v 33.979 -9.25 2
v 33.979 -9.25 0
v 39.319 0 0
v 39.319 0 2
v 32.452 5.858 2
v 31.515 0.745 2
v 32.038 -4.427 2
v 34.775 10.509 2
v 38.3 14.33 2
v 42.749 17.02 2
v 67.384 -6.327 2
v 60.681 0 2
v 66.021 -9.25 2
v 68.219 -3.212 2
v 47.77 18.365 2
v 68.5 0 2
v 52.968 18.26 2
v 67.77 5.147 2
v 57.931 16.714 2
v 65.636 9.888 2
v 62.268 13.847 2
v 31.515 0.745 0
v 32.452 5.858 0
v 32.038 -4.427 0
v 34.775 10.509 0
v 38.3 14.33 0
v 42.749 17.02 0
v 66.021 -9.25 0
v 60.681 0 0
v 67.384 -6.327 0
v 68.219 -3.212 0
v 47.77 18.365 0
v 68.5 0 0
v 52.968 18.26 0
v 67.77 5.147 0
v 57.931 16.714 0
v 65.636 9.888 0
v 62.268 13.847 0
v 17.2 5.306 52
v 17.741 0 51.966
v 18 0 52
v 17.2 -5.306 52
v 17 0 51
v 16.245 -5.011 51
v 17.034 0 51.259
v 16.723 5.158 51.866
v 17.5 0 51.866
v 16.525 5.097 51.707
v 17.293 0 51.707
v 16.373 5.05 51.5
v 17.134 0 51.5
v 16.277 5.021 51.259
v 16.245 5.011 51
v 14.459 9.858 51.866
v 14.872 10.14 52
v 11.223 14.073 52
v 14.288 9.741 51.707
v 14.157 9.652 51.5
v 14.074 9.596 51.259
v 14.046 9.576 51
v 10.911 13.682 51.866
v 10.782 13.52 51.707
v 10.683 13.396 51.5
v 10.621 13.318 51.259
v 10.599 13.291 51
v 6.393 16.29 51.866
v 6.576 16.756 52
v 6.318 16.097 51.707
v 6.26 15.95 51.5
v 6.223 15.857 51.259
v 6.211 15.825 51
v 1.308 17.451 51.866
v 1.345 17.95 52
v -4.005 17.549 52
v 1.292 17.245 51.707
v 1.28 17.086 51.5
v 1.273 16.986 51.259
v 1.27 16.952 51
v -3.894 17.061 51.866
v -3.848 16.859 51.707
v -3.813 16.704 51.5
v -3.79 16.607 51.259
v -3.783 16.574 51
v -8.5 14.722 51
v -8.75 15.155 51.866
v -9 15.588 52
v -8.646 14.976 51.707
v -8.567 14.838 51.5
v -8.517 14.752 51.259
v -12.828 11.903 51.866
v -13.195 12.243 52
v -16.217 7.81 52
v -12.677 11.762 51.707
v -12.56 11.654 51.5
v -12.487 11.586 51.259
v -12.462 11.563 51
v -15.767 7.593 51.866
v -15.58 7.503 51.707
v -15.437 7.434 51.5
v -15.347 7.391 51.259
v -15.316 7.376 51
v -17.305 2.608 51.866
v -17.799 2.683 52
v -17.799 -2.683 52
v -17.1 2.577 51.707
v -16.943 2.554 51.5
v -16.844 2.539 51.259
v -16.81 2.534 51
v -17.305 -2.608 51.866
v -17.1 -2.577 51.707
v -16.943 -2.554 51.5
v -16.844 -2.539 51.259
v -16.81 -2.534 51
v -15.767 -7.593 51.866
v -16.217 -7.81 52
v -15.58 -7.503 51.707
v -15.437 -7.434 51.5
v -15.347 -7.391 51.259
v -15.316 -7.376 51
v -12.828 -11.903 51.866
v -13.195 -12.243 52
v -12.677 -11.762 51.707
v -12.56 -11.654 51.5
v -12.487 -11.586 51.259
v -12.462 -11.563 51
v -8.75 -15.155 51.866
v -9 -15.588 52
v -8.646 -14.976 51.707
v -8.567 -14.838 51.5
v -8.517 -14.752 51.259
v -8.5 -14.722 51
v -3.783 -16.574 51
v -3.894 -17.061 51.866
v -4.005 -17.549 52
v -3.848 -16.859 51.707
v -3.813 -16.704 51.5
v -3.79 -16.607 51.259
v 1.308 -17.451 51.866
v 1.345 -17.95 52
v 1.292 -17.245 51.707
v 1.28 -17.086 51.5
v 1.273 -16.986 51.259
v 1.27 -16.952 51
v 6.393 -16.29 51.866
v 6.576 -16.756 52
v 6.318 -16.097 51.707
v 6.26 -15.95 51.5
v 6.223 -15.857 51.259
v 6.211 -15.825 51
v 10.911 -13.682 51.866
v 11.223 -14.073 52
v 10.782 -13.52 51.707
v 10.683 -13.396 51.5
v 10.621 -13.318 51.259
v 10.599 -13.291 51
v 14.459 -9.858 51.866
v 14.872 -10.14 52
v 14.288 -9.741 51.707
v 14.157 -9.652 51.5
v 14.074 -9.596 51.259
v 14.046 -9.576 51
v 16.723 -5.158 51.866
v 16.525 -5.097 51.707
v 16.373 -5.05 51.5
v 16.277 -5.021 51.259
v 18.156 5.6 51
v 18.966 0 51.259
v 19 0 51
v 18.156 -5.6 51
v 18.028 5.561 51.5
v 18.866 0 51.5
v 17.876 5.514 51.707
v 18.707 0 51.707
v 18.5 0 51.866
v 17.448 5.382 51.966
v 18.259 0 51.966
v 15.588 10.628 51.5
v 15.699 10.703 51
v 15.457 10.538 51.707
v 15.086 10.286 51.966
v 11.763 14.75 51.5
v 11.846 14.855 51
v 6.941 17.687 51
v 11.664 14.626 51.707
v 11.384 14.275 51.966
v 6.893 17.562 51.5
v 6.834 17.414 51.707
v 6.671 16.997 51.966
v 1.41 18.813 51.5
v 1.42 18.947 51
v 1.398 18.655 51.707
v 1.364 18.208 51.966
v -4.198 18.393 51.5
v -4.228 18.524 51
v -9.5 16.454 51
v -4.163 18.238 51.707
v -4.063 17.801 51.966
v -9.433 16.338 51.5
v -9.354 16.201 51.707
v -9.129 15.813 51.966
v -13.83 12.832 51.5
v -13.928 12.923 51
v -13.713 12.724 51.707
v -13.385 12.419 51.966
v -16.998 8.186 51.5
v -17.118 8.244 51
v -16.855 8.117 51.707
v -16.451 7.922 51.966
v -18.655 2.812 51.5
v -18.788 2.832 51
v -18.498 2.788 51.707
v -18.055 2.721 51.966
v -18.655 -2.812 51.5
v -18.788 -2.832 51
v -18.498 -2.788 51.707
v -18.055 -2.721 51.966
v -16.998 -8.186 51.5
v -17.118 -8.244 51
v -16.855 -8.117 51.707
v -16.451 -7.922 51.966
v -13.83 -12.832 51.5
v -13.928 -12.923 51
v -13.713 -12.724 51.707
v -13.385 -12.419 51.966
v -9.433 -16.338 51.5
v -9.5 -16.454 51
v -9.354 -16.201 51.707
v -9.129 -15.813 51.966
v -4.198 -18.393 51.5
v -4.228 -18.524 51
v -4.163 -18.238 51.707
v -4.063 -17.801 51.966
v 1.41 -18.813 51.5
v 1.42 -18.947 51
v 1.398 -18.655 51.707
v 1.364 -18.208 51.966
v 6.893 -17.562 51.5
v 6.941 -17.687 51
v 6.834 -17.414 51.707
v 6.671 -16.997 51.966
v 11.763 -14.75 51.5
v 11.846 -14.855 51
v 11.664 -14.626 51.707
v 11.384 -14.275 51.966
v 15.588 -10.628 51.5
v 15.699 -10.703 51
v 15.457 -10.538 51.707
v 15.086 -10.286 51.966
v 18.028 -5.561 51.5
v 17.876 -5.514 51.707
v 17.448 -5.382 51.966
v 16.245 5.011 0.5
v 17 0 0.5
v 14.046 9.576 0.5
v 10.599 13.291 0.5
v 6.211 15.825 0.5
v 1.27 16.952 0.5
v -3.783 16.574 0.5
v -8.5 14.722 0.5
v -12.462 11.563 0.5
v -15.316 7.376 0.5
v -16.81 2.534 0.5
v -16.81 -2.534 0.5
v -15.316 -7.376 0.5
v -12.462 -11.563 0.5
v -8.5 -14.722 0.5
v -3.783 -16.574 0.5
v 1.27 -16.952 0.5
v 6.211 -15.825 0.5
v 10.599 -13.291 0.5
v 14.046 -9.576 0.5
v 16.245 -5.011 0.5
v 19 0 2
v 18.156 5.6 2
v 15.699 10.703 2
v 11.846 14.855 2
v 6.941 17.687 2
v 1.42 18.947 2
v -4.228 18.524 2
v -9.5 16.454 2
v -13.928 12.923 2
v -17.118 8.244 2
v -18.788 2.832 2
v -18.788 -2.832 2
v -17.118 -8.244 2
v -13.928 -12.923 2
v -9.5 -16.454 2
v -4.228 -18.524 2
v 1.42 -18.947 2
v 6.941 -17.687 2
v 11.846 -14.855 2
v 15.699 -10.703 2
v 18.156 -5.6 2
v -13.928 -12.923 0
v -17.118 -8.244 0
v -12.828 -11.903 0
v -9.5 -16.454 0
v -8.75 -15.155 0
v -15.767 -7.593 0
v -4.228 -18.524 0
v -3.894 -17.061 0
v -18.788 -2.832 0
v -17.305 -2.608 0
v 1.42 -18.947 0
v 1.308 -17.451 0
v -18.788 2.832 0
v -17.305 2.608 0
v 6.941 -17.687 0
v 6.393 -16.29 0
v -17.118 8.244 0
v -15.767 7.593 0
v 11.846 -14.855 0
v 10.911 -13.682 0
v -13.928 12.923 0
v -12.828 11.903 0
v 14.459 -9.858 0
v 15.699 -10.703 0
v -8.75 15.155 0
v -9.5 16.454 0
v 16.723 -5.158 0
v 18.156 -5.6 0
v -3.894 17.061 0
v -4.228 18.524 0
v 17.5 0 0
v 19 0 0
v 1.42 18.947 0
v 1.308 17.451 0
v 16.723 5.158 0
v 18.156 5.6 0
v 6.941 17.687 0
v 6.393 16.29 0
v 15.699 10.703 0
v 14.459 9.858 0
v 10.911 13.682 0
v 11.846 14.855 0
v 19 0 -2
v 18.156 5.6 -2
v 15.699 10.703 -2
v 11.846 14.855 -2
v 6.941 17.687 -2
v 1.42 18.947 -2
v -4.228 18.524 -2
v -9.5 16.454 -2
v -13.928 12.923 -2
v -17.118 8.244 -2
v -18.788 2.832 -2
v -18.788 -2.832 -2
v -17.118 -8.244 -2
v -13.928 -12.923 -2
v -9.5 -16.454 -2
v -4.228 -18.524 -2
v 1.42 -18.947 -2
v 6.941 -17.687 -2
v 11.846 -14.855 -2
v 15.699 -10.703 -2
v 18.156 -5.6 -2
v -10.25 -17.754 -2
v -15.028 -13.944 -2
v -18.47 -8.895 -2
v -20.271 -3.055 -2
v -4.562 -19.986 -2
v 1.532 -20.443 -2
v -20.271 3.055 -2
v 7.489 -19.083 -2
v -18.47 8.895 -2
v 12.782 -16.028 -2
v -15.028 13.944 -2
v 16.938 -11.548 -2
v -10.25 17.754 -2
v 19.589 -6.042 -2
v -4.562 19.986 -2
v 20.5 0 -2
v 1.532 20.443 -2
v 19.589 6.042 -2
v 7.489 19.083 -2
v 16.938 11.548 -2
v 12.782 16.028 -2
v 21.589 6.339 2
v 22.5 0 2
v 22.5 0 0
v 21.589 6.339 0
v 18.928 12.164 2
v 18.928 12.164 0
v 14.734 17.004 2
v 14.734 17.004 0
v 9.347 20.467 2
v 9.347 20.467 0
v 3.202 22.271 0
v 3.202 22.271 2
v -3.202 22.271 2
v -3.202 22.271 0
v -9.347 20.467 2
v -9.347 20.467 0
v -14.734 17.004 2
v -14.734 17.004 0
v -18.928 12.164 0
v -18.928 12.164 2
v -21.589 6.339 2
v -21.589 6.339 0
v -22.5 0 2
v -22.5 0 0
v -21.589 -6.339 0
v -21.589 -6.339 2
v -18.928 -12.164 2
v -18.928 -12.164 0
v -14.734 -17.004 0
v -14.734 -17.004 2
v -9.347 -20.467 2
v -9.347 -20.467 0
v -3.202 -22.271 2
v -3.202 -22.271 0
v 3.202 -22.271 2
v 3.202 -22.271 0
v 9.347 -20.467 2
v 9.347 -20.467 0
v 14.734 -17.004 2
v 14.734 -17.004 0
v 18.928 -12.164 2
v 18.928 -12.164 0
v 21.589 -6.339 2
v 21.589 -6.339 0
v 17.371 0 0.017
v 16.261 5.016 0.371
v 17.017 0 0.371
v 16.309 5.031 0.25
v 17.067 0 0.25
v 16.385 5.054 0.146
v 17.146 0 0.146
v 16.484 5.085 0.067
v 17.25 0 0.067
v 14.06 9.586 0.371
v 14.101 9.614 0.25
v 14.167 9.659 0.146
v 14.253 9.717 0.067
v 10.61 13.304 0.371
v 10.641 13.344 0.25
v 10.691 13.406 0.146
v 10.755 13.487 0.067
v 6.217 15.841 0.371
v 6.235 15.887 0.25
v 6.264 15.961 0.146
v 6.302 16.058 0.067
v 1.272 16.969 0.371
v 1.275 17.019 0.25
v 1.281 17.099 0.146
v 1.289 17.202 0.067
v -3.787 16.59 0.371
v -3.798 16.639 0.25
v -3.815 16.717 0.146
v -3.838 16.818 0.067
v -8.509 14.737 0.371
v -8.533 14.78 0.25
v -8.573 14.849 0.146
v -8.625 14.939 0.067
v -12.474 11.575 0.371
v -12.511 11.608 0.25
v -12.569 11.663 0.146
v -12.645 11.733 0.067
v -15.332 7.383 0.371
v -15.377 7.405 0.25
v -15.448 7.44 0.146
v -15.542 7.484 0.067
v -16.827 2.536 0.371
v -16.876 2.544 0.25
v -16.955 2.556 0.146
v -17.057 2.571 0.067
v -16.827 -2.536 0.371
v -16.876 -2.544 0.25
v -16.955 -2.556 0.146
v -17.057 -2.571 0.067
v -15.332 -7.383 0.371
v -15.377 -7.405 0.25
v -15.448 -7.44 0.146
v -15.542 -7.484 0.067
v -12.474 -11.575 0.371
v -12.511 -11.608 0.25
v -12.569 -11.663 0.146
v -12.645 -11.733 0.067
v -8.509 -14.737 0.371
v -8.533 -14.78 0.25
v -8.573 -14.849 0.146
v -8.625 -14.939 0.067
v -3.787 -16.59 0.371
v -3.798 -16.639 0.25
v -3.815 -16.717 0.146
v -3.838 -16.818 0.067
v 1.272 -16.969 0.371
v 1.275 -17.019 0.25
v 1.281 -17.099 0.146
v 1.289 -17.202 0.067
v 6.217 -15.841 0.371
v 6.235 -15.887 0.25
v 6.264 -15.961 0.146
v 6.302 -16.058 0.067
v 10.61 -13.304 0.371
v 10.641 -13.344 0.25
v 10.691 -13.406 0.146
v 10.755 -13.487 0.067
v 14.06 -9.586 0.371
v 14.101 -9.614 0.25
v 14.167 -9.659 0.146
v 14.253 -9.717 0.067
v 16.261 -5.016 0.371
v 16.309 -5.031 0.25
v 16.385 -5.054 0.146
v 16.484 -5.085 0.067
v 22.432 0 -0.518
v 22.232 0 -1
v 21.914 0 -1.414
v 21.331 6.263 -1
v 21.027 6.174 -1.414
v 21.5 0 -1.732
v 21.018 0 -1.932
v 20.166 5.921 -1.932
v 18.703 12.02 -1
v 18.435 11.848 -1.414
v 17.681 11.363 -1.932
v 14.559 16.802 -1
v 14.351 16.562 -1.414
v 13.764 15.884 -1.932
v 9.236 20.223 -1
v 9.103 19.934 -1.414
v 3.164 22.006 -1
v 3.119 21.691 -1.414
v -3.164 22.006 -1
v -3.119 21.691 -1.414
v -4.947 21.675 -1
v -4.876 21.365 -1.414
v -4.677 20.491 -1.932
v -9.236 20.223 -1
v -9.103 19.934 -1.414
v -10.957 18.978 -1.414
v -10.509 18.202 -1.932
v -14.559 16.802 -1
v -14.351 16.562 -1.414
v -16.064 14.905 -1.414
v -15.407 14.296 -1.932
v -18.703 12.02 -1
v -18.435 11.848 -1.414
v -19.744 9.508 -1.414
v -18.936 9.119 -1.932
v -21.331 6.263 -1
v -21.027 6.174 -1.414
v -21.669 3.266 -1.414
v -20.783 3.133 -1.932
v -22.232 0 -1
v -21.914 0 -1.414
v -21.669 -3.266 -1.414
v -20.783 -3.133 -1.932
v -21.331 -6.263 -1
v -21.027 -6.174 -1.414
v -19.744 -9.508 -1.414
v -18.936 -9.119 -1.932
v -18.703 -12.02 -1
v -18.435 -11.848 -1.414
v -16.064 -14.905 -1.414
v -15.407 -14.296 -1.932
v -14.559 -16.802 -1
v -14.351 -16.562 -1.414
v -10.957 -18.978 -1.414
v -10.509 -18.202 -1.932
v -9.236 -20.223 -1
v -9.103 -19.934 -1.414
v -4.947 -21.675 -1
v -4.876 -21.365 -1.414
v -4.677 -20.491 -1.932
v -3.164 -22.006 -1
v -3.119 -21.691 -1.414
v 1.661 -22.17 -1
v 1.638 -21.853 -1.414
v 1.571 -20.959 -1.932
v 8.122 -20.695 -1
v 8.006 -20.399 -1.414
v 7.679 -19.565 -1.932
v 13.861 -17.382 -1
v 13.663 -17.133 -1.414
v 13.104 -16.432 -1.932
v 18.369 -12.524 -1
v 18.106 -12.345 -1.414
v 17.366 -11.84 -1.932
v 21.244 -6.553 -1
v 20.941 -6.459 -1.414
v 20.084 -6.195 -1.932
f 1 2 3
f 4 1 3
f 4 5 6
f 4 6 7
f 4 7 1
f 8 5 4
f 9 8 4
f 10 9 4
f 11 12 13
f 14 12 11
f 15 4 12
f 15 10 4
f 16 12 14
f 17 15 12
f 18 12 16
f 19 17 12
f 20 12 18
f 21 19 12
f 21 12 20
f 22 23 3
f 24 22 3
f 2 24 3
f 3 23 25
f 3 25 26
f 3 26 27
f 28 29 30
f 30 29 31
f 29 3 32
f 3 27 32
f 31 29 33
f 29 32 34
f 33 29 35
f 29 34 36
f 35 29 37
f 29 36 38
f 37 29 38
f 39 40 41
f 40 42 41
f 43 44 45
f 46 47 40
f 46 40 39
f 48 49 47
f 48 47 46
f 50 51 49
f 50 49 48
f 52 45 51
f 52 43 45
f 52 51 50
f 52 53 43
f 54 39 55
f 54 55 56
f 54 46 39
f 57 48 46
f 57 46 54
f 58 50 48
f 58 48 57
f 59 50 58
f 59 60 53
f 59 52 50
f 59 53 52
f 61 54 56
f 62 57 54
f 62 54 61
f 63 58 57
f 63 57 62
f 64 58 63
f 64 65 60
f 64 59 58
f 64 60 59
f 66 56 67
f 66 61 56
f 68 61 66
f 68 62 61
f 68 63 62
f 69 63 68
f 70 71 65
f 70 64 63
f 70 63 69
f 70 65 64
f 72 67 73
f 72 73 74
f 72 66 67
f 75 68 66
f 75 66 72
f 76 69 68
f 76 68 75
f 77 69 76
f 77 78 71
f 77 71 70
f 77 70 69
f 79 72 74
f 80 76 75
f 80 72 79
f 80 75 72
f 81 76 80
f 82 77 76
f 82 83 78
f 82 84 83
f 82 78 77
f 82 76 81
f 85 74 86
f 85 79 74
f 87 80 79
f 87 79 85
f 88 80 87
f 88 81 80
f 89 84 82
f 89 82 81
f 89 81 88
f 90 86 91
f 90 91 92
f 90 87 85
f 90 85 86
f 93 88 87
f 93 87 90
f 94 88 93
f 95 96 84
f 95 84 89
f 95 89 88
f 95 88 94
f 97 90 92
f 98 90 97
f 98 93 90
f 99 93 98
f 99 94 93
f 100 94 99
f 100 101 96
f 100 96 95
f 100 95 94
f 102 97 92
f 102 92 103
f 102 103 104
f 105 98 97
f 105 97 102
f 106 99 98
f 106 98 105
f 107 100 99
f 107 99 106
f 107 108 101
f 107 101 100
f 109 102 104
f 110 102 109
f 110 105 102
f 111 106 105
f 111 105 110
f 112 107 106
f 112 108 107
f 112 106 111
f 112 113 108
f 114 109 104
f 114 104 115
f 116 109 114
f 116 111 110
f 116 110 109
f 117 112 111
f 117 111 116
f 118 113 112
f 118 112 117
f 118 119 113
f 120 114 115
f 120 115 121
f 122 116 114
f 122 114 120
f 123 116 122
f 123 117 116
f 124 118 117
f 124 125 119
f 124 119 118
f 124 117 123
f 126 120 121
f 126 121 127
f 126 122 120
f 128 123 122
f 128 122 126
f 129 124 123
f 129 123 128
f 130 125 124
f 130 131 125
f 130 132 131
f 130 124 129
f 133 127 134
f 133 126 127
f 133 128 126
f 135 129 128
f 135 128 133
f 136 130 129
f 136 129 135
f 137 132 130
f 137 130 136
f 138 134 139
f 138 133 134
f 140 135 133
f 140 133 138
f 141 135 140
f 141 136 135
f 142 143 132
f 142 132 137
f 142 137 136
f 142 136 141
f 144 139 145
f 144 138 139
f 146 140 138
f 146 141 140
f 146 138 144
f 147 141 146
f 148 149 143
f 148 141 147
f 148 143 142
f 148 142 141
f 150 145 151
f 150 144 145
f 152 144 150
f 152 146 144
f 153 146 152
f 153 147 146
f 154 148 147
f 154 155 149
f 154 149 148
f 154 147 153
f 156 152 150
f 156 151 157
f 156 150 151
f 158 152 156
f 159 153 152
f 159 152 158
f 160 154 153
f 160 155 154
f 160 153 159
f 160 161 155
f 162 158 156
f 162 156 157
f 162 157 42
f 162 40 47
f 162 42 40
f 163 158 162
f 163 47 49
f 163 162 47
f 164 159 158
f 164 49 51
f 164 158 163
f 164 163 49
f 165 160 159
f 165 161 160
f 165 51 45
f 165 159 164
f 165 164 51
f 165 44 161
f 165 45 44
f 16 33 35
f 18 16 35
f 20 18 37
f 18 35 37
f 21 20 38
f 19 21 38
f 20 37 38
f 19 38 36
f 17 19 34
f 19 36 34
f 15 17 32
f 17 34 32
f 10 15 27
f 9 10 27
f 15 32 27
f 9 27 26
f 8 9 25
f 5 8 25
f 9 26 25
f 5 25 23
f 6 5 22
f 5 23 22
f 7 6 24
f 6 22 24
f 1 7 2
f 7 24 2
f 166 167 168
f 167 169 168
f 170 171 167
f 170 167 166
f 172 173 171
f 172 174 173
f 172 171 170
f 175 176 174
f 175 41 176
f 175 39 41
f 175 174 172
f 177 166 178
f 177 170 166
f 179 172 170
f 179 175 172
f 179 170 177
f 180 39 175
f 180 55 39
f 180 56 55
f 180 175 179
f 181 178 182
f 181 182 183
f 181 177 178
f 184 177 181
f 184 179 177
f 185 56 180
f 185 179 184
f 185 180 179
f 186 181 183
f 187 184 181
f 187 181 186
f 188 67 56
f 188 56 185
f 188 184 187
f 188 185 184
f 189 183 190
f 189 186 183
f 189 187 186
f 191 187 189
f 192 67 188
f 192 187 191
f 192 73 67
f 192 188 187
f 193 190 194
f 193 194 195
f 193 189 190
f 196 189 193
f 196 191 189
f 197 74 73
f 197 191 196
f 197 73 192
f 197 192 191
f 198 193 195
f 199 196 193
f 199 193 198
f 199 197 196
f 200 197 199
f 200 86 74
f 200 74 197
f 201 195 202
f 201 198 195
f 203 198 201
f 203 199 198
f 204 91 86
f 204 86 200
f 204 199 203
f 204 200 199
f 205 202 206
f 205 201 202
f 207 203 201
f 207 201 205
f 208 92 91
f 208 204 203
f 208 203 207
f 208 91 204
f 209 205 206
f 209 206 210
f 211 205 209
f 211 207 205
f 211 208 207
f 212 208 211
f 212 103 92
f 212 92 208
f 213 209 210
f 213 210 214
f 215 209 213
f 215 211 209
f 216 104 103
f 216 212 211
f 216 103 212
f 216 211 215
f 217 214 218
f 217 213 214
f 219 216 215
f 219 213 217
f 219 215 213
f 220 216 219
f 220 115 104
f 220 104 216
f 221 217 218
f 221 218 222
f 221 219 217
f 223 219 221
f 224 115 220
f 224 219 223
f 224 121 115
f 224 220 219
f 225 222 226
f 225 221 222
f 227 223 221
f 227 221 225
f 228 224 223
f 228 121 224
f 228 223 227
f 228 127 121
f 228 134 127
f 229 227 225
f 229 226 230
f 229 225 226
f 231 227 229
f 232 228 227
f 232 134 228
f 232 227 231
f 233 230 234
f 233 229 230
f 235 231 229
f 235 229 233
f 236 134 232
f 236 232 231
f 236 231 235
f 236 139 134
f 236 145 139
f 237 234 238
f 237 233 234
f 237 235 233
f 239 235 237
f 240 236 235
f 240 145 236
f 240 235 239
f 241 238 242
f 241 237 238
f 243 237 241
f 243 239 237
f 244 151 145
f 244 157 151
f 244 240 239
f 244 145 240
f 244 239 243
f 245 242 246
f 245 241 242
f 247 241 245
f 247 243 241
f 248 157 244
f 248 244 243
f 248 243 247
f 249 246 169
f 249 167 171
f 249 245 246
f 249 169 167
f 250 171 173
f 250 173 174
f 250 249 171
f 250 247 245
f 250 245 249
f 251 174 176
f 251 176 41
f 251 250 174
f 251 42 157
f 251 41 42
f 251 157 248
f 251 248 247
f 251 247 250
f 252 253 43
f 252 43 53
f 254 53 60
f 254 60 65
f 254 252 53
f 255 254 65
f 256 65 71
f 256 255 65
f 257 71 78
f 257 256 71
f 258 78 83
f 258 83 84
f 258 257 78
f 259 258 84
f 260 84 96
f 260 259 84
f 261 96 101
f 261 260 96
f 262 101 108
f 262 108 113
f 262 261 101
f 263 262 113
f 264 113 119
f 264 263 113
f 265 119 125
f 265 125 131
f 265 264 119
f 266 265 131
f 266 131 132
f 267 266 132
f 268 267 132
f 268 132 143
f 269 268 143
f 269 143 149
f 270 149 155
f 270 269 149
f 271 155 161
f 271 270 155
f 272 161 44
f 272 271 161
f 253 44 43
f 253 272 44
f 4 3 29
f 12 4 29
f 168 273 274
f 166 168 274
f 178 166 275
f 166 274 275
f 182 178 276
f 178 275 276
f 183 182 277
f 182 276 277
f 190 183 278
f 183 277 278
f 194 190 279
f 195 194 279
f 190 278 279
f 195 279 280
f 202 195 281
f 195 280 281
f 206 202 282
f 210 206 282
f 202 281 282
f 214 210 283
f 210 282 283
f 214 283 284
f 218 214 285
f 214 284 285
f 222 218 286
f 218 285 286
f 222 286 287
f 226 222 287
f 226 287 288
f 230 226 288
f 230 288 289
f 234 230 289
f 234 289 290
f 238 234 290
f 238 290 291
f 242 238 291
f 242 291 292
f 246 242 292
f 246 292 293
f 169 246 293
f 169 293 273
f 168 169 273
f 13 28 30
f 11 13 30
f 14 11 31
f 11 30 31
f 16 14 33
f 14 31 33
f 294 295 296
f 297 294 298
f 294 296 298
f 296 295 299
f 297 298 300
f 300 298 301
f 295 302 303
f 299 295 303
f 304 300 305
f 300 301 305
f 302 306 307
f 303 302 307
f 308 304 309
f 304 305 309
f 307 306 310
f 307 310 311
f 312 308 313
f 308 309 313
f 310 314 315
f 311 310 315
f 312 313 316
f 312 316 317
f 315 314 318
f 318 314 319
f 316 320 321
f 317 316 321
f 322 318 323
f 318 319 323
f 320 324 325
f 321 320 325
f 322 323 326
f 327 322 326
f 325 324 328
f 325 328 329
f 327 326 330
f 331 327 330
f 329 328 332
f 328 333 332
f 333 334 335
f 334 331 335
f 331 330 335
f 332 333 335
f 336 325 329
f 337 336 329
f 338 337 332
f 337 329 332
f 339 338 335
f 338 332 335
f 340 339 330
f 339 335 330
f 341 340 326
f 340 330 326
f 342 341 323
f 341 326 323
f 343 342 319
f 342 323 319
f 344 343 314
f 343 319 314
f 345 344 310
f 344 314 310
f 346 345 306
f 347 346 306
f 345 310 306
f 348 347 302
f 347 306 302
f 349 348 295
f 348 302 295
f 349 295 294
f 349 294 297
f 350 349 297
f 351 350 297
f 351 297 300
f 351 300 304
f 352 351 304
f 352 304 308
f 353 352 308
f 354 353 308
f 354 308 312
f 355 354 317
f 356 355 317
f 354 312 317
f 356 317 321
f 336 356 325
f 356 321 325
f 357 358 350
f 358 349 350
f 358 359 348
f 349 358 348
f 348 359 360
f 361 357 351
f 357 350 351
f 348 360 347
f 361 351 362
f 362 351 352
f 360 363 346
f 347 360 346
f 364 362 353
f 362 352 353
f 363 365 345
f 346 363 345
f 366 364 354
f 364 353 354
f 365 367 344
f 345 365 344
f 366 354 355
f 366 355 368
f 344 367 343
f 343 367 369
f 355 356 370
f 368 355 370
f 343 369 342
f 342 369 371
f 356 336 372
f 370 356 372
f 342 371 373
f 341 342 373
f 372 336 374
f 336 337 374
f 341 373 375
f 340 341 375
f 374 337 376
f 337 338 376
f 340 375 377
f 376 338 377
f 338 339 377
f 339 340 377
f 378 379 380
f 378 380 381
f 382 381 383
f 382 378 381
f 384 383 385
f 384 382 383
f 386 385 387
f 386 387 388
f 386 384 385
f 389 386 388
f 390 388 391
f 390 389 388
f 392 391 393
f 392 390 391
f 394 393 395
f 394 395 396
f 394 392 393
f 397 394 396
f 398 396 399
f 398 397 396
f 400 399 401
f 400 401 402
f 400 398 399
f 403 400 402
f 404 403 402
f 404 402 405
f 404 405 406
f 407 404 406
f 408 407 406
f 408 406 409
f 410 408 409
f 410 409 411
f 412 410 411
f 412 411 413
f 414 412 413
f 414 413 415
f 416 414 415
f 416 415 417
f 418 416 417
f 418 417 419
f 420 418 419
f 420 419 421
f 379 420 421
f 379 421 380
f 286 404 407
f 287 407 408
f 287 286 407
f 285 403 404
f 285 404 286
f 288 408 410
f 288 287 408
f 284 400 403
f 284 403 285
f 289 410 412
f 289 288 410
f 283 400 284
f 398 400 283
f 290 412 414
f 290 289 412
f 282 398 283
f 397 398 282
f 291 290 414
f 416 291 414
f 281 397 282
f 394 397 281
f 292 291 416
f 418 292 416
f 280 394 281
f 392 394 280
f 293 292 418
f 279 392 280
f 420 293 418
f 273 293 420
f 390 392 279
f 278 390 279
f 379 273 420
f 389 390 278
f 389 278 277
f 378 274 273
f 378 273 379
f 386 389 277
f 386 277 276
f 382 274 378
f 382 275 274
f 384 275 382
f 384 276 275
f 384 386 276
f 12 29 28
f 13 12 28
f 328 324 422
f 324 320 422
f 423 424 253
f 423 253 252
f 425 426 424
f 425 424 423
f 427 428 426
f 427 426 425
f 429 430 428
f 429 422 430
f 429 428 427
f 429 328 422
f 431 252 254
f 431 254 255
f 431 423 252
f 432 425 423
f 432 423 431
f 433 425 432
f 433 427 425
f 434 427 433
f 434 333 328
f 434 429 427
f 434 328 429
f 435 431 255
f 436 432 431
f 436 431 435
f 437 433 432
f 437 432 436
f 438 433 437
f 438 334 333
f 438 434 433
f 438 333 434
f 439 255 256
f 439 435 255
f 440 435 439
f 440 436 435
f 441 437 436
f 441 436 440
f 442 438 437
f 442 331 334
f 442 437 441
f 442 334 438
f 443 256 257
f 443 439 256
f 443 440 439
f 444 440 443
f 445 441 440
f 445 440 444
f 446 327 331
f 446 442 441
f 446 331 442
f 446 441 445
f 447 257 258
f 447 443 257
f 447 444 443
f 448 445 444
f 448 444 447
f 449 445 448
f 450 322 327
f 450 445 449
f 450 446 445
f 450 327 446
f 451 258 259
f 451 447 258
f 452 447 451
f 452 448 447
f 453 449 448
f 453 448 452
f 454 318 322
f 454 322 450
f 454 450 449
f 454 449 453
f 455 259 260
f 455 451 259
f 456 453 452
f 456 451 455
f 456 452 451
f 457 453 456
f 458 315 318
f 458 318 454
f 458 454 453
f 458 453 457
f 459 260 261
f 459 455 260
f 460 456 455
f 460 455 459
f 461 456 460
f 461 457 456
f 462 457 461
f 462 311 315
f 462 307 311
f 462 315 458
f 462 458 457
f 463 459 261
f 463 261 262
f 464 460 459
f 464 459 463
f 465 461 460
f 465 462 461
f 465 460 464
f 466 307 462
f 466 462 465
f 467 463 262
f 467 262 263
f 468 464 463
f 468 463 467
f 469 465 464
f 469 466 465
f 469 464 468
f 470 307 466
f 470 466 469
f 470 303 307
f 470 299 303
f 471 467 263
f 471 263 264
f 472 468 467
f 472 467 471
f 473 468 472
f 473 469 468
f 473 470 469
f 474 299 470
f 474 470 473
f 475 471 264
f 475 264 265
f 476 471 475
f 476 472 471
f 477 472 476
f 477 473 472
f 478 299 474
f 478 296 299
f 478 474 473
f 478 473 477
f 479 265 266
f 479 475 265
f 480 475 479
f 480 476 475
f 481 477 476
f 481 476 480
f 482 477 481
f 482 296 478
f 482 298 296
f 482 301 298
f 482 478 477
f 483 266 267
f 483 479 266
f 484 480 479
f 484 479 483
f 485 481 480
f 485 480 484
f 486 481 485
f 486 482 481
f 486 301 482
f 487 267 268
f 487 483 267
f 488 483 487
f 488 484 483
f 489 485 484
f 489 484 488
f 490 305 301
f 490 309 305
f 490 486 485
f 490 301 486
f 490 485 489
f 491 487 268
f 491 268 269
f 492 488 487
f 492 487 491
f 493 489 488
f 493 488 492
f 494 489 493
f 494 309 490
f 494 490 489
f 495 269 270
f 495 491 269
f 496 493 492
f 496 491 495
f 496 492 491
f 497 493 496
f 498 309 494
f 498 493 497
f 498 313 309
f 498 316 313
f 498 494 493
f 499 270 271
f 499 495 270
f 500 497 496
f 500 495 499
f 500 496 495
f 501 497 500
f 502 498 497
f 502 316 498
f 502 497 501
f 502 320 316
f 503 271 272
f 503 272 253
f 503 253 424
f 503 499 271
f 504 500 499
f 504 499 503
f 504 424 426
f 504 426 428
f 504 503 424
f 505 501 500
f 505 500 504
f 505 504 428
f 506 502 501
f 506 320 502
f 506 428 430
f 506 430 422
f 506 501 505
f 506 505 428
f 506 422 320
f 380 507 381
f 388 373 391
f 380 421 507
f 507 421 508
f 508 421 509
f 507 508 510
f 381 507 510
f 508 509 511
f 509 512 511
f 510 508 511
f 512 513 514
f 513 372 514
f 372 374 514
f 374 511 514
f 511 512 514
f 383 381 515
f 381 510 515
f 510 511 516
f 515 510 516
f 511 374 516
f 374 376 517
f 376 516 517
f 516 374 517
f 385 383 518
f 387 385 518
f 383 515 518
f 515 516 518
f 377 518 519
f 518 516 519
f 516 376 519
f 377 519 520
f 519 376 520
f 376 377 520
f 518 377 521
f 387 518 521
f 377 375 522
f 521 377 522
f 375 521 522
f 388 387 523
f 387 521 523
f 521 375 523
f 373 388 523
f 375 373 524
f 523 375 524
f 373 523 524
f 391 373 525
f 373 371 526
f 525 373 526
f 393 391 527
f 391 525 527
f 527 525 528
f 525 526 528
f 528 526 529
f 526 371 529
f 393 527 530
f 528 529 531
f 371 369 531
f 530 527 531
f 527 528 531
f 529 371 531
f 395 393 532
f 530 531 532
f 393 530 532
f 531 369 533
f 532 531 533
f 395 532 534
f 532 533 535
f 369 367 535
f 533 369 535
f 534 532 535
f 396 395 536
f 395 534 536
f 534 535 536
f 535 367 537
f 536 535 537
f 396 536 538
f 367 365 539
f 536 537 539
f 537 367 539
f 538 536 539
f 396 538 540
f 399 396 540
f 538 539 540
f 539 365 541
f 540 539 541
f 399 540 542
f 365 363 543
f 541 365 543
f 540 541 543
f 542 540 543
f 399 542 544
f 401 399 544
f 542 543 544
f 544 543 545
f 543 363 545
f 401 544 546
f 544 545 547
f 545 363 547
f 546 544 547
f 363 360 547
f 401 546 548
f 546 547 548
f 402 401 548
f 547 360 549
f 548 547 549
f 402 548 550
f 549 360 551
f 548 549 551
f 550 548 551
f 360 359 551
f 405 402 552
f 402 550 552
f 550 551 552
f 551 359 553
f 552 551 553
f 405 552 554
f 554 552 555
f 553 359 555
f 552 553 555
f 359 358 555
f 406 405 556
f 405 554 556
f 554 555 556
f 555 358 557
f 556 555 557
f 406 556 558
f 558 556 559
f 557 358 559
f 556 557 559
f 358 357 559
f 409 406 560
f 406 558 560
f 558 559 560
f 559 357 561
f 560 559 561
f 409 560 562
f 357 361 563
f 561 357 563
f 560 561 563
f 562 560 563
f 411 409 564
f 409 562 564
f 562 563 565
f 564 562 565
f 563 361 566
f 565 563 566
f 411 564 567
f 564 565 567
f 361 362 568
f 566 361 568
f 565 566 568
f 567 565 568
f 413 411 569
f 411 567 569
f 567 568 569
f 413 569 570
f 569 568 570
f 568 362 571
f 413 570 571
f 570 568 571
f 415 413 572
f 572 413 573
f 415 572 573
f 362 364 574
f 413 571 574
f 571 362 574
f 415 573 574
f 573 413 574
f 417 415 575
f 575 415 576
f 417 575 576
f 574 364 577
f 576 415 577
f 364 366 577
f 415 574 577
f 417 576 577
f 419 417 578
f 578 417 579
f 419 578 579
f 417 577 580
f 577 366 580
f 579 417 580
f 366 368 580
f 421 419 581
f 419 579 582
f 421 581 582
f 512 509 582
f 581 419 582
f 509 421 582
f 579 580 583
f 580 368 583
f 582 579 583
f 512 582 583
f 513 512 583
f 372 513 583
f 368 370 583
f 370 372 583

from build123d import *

# Parameters (mm, degrees)
F0_R          = 19
F0_R_2        = 17
F1_DEPTH      = 52
F0_R_3        = 22.5
F2_DEPTH      = 2
F2_DEPTH_BACK = 2
F3_R          = 1.99999
F4_R          = 0.99999
F5_DEPTH      = 2
F6_R          = 0.5


# Not quite as in the source:
# - a fillet or chamfer is up to 0.001 mm smaller than in the source, because OpenCascade refuses the exact size


with BuildPart() as f1:
    # F0 (on Top) → F1 (new body)
    with BuildSketch(Plane.XY):
        Circle(F0_R)
        Circle(F0_R_2, mode=Mode.SUBTRACT)
    extrude(amount=F1_DEPTH)

    # F0 (on Top) → F2 (join, two sides)
    with BuildSketch(Plane.XY) as f2_sk:
        Circle(F0_R_3)
        Circle(F0_R, mode=Mode.SUBTRACT)
    extrude(amount=F2_DEPTH)
    extrude(f2_sk.sketch, amount=-F2_DEPTH_BACK)

    # F3 (radius 2 in the source; OpenCascade refuses exactly that, so slightly less here)
    f3_edges = [f1.edges().sort_by_distance(p)[0] for p in [
        (-22.5, 0, -2),
    ]]
    fillet(f3_edges, radius=F3_R)

    # F4 (radius 1 in the source; OpenCascade refuses exactly that, so slightly less here)
    f4_edges = [f1.edges().sort_by_distance(p)[0] for p in [
        (-19, 0, 52),
        (-17, 0, 52),
    ]]
    fillet(f4_edges, radius=F4_R)

    # F6
    f6_edges = [f1.edges().sort_by_distance(p)[0] for p in [
        (-17, 0, 0),
    ]]
    fillet(f6_edges, radius=F6_R)


with BuildPart() as f5:
    # F0 (on Top) → F5 (new body)
    with BuildSketch(Plane.XY):
        with BuildLine():
            ThreePointArc((66.02146997, -9.25), (67.8696277863, -4.7881523344), (68.5, 0))
            ThreePointArc((68.5, 0), (45.2118476656, 17.8696277863), (33.97853003, -9.25))
            Line((33.97853003, -9.25), (39.31902002, 0))
            Line((39.31902002, 0), (60.68097998, 0))
            Line((60.68097998, 0), (66.02146997, -9.25))
        make_face()
    extrude(amount=F5_DEPTH)


solid = Compound([f1.part, f5.part])
